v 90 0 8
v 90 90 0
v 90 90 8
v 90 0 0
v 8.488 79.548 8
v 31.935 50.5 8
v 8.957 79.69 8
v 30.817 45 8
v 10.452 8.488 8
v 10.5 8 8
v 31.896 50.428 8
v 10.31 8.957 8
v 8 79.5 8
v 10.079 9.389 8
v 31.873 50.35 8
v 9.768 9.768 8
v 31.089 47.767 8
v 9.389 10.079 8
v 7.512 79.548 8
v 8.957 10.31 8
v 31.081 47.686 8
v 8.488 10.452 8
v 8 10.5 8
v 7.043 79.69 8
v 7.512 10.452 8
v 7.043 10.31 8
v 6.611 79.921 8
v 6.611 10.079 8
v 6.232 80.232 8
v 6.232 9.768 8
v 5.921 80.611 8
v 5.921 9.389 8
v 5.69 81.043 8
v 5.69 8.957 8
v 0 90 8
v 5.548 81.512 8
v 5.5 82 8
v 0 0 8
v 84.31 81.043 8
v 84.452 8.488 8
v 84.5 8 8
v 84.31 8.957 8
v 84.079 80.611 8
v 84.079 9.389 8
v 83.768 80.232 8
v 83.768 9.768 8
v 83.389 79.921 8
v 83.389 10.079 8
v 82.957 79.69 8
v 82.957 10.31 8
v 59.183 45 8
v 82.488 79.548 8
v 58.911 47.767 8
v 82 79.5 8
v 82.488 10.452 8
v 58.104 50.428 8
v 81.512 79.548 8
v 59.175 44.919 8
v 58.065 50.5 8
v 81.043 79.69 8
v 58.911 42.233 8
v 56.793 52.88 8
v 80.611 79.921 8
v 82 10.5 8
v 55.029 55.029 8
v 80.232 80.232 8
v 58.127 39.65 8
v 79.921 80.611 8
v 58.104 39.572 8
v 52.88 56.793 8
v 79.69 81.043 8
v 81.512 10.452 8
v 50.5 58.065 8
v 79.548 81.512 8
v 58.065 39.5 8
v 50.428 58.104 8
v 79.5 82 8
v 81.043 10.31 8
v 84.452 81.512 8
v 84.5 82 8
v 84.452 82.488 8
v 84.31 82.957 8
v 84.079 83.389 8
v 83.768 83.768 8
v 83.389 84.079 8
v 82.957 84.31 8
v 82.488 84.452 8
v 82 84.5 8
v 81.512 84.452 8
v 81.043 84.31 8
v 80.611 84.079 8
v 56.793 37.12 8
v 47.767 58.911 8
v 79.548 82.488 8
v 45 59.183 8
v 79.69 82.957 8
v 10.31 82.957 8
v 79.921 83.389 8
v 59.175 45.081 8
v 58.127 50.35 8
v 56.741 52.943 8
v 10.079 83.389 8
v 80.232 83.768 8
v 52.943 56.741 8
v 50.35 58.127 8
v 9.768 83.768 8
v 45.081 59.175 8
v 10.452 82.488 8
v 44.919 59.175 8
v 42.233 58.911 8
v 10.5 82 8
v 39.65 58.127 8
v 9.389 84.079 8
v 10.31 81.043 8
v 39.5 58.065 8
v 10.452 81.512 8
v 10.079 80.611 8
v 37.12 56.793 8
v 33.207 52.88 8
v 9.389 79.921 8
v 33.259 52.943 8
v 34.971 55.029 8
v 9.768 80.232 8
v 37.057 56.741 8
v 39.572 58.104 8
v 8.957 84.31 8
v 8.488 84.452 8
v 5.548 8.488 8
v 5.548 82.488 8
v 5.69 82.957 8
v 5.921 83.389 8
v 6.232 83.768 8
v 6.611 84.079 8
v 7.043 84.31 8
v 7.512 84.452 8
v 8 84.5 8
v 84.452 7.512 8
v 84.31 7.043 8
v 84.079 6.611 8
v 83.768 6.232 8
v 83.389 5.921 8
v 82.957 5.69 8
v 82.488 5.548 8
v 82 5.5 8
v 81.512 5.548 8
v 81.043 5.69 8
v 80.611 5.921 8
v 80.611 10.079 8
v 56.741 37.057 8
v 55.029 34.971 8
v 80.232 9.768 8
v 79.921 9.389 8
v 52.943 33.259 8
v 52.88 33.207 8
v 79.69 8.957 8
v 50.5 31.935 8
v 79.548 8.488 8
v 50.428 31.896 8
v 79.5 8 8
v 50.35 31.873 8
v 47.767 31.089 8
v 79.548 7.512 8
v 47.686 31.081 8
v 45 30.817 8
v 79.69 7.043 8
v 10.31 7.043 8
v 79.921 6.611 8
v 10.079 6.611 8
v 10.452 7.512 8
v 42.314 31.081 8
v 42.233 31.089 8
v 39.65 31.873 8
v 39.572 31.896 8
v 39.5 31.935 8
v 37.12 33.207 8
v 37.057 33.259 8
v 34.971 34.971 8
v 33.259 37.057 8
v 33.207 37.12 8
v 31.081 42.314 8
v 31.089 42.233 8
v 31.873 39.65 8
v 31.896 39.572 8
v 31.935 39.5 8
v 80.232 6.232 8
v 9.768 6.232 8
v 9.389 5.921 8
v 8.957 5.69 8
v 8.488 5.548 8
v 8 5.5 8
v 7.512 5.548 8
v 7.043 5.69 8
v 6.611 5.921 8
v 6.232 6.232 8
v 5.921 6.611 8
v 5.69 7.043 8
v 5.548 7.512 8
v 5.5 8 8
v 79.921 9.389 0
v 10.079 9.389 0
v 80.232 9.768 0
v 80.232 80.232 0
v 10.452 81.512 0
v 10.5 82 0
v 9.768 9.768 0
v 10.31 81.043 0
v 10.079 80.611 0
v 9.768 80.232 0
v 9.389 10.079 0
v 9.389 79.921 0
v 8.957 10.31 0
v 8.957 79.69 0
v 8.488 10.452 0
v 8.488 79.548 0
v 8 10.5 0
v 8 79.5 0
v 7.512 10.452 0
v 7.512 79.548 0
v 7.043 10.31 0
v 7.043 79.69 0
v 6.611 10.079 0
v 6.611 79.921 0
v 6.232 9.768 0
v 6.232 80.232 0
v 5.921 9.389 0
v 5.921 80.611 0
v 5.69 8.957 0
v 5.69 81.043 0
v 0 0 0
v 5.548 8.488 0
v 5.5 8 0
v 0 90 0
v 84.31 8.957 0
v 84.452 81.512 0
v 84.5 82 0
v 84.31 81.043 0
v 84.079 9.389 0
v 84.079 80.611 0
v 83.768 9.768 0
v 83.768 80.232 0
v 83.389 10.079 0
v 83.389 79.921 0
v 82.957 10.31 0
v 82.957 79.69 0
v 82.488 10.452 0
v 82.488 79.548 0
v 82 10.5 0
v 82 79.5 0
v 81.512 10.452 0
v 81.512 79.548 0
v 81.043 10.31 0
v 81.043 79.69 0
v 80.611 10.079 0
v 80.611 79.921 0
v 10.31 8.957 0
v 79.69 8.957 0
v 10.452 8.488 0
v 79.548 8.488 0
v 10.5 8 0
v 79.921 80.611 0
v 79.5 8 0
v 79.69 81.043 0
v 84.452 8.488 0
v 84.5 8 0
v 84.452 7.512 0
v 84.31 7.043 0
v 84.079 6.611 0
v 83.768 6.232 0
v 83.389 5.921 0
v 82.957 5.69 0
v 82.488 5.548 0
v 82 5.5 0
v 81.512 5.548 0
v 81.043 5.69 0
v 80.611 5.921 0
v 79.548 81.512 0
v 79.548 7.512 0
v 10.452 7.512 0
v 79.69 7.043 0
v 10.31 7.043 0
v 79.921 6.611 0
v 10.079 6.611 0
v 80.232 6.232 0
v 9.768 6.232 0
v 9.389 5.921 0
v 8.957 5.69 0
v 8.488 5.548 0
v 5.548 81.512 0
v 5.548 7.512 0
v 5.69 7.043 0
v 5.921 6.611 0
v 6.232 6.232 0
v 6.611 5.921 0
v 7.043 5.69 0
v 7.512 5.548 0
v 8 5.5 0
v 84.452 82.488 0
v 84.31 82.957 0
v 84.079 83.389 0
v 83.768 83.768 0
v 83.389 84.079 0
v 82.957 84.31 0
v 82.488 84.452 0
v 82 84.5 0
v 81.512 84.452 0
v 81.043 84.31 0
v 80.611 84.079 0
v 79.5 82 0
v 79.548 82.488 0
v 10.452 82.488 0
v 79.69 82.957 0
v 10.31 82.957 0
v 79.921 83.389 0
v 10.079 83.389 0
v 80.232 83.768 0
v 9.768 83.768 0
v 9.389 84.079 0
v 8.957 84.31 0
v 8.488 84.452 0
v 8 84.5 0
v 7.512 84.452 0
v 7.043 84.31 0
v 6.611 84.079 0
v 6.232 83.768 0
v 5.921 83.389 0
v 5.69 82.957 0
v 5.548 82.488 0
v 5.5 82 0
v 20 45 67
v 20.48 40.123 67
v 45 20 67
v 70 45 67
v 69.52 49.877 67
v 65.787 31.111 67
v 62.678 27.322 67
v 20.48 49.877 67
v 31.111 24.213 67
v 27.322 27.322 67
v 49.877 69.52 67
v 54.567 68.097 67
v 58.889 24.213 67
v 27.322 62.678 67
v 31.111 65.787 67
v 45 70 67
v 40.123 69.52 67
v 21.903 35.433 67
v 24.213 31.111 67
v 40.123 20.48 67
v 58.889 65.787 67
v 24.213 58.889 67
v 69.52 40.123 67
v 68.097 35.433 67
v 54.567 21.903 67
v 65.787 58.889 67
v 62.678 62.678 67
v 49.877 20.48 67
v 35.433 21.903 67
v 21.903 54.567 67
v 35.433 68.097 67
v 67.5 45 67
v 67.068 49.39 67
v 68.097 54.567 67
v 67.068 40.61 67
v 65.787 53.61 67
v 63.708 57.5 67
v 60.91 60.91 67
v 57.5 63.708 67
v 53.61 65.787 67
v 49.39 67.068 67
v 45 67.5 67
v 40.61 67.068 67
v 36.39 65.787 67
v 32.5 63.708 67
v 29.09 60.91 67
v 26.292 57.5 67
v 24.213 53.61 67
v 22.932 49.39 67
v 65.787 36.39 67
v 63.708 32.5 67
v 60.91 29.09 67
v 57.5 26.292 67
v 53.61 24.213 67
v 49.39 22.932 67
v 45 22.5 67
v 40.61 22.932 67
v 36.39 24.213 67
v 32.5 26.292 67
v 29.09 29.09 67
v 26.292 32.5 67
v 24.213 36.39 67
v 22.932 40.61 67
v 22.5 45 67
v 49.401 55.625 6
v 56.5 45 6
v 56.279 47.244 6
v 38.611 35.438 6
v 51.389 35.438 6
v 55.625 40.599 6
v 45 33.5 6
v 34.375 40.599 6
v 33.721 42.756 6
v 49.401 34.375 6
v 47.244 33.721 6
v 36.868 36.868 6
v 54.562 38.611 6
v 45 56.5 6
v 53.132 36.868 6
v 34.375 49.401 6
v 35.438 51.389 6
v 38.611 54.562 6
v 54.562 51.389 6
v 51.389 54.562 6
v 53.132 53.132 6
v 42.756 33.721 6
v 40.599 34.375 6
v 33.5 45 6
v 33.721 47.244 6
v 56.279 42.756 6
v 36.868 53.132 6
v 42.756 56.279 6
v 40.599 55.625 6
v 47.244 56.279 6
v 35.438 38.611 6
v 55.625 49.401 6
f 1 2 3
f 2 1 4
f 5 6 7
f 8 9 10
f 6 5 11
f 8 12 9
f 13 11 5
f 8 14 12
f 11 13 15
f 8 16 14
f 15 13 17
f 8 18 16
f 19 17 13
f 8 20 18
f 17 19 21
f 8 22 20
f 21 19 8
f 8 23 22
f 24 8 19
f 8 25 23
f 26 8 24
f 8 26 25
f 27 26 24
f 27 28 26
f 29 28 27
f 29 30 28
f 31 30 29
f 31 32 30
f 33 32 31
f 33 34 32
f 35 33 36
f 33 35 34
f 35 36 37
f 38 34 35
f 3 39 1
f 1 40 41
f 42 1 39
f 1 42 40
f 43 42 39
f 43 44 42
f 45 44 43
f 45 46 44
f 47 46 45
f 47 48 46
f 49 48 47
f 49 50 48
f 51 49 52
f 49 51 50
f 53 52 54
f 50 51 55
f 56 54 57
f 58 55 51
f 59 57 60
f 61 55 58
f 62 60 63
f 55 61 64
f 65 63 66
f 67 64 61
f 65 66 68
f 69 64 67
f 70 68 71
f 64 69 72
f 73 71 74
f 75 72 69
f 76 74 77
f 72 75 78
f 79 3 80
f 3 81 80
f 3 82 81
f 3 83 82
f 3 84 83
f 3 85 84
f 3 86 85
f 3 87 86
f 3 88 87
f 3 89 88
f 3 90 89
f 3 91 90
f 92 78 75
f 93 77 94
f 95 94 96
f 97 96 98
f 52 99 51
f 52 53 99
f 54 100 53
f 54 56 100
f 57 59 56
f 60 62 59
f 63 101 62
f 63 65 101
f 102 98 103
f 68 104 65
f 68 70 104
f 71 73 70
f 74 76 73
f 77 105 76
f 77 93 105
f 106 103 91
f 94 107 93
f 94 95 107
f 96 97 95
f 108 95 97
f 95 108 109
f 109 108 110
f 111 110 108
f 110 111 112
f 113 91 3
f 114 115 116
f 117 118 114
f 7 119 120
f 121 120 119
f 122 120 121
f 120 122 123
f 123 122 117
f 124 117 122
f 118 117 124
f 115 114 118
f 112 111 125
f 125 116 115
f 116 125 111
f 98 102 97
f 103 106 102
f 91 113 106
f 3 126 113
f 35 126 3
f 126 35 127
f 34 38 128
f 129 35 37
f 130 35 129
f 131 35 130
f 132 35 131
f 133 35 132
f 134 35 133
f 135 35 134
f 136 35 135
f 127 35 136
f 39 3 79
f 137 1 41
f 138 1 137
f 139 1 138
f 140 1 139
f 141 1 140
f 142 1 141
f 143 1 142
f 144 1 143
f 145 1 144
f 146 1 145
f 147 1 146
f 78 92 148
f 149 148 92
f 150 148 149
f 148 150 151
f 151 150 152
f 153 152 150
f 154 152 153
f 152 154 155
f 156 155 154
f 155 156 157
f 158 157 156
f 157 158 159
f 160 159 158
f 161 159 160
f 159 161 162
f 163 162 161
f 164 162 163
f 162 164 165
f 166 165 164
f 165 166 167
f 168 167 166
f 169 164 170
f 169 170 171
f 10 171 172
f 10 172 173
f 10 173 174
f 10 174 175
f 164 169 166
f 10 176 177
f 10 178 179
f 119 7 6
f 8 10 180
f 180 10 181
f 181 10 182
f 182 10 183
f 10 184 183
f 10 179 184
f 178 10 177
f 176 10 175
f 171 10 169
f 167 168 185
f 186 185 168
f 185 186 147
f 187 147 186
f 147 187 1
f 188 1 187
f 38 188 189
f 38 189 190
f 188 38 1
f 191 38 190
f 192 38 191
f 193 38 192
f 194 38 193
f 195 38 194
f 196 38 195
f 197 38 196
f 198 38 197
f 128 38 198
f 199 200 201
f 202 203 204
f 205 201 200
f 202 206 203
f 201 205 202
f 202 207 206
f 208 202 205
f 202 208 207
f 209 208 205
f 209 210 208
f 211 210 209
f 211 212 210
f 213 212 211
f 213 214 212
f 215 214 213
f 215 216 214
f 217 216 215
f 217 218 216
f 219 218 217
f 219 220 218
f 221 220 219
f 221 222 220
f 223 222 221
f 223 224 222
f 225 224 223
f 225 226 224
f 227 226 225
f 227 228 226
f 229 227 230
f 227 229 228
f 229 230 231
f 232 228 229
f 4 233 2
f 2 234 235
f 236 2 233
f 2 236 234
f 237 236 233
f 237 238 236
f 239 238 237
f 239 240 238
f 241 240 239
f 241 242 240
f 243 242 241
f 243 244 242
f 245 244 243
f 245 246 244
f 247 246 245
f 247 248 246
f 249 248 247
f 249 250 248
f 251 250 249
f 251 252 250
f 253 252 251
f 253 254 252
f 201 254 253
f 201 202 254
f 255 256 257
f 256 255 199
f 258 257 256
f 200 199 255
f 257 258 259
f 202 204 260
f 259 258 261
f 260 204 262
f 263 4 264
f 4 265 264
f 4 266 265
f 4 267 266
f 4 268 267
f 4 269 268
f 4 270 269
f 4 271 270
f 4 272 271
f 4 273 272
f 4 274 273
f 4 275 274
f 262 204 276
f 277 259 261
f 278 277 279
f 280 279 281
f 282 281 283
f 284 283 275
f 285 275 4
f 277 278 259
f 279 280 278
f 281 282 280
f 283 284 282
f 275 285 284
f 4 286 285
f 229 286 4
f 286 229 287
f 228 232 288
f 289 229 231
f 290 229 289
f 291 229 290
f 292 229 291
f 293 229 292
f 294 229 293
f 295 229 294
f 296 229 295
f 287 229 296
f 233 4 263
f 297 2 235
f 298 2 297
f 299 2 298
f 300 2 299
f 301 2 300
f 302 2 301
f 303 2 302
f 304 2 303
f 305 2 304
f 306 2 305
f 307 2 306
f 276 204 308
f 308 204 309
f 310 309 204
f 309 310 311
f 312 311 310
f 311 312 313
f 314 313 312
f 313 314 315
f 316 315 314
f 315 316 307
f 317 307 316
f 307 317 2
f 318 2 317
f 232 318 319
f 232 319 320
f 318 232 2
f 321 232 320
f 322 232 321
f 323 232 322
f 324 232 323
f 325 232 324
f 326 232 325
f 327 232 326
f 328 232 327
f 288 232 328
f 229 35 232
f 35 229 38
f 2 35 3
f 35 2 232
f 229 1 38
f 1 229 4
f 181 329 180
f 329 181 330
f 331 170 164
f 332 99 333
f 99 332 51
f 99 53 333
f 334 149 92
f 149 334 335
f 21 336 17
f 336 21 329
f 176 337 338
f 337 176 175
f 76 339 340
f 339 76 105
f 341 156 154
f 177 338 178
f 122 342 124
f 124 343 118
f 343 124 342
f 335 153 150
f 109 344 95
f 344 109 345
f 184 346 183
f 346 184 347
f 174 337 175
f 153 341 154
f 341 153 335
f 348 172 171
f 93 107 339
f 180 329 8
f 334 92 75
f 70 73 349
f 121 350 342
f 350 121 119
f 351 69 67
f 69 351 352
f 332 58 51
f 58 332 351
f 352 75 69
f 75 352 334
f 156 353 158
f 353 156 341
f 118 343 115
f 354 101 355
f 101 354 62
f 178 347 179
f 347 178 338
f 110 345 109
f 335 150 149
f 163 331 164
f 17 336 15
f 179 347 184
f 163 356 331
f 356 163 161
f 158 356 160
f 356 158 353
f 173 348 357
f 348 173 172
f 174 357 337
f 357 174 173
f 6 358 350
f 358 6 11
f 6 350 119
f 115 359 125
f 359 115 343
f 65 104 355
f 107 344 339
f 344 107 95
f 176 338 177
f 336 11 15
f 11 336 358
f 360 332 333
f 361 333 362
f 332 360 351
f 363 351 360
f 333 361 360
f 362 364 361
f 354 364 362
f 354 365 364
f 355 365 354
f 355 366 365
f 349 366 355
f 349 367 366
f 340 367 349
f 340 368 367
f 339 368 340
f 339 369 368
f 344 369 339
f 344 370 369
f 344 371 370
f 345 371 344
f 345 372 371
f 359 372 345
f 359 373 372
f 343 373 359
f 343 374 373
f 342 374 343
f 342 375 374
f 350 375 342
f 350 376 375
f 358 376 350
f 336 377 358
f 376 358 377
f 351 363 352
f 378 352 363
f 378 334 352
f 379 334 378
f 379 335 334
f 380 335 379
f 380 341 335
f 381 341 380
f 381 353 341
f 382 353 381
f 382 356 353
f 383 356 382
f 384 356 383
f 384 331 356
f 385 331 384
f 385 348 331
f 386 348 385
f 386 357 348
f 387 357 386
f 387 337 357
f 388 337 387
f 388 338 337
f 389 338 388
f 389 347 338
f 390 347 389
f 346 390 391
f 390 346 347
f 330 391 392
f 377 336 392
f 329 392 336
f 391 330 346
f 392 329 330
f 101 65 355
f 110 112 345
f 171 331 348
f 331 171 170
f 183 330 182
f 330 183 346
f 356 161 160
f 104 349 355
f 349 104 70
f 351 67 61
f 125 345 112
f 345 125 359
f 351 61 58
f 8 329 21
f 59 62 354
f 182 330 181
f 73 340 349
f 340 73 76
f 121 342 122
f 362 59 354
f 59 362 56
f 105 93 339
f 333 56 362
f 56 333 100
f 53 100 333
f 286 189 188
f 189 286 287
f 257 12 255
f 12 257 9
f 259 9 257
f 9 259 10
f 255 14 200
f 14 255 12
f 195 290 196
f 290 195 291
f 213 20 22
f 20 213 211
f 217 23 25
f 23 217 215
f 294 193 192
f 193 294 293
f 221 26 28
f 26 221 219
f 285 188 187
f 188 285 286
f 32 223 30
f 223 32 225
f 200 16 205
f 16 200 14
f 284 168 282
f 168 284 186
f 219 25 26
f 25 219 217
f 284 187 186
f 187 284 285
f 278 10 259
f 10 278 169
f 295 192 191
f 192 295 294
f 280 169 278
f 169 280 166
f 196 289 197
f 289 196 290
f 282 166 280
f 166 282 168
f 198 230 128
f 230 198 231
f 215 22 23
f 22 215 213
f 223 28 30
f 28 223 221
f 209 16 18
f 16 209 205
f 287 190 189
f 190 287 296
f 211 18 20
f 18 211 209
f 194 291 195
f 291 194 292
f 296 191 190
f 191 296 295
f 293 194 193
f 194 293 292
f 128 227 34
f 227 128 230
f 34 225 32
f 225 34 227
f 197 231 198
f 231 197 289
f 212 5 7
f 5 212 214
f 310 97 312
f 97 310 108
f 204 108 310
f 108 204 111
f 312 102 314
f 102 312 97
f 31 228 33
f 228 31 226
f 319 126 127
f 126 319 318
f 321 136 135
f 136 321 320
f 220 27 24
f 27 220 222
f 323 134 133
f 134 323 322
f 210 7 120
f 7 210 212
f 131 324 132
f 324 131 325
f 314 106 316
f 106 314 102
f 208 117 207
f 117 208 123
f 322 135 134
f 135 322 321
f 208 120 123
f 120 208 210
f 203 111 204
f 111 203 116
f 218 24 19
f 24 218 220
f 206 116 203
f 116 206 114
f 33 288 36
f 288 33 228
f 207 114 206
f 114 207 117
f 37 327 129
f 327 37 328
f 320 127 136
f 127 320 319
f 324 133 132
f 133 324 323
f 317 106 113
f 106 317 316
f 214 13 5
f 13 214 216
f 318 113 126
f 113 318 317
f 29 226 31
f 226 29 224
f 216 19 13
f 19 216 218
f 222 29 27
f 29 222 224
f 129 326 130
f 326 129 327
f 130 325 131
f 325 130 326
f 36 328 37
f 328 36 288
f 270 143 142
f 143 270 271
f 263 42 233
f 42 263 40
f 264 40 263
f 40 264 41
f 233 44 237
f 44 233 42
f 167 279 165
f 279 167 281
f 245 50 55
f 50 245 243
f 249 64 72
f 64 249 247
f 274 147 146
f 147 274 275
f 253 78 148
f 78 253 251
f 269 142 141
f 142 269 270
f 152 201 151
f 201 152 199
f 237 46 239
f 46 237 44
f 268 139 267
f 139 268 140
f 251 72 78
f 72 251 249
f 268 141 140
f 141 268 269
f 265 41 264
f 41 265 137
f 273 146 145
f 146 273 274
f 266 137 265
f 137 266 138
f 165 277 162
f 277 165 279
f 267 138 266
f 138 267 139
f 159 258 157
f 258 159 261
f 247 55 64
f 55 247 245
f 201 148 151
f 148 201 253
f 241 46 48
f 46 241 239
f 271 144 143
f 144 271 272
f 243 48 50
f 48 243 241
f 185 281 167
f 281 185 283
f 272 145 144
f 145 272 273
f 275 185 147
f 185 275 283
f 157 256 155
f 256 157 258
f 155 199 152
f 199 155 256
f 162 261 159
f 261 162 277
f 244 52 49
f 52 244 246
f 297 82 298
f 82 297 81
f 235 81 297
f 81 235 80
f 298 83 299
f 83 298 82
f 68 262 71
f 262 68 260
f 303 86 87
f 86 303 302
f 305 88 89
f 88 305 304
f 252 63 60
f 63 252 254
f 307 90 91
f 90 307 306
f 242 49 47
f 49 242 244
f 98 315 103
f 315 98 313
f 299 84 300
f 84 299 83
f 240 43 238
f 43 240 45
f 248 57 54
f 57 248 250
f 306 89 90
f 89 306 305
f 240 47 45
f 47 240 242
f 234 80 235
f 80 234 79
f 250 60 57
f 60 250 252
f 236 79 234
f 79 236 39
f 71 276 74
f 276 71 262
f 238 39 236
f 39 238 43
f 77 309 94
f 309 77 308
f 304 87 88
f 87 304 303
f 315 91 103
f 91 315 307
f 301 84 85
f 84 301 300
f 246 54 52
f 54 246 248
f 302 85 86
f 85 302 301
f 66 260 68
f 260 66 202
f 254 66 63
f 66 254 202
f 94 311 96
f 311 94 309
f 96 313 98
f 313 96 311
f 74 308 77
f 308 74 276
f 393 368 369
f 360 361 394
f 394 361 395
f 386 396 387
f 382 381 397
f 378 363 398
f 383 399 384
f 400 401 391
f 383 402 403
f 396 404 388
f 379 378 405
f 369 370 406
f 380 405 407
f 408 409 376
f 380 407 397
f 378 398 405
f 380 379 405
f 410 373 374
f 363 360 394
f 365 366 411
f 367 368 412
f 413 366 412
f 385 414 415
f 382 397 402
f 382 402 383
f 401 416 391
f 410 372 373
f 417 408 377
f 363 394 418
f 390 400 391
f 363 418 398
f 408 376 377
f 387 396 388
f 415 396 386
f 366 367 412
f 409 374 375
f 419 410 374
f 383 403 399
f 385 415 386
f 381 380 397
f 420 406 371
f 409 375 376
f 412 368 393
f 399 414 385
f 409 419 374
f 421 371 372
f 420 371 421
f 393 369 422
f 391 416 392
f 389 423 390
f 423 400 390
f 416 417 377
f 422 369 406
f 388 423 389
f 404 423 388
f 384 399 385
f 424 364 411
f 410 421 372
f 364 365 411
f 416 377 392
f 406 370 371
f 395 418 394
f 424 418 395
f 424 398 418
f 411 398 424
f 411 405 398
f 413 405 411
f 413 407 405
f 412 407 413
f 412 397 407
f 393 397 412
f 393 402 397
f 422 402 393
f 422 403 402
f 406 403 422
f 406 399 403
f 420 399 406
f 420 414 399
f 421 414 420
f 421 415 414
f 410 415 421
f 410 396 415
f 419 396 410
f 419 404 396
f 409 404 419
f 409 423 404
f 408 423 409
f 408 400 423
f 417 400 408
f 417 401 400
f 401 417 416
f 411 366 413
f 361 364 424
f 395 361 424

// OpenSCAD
$fn = 32;

// ----------------------------------------------------------------------
// Hopper: flanged with square flange
// ----------------------------------------------------------------------

// --- parameters (mm) ---
fl = 90;                  // flange side, X and Y
fl_t = 8;                 // flange thickness
cone_h = 60;              // cone height above the flange
top_d = 50;               // cone mouth diameter
bot_d = 28;               // cone spout diameter
wall = 2.5;               // cone wall thickness
hole_r = 2.5;             // flange hole radius
hole_in = 8;              // hole inset from the corners

bore_d = bot_d - 2 * wall;  // spout bore diameter
total_h = fl_t + cone_h - 1;  // overall height

difference() {
  union() {
    cube([fl, fl, fl_t]);
    translate([fl / 2, fl / 2, fl_t - 1])
      cylinder(h = cone_h, d1 = bot_d, d2 = top_d);
  }
  translate([fl / 2, fl / 2, fl_t - 2])
    cylinder(h = cone_h + 1, d1 = bore_d, d2 = top_d - 2 * wall);
  for (sx = [0, 1], sy = [0, 1])
    translate([sx ? fl - hole_in : hole_in,
               sy ? fl - hole_in : hole_in, -1])
      cylinder(r = hole_r, h = fl_t + 2);
}
